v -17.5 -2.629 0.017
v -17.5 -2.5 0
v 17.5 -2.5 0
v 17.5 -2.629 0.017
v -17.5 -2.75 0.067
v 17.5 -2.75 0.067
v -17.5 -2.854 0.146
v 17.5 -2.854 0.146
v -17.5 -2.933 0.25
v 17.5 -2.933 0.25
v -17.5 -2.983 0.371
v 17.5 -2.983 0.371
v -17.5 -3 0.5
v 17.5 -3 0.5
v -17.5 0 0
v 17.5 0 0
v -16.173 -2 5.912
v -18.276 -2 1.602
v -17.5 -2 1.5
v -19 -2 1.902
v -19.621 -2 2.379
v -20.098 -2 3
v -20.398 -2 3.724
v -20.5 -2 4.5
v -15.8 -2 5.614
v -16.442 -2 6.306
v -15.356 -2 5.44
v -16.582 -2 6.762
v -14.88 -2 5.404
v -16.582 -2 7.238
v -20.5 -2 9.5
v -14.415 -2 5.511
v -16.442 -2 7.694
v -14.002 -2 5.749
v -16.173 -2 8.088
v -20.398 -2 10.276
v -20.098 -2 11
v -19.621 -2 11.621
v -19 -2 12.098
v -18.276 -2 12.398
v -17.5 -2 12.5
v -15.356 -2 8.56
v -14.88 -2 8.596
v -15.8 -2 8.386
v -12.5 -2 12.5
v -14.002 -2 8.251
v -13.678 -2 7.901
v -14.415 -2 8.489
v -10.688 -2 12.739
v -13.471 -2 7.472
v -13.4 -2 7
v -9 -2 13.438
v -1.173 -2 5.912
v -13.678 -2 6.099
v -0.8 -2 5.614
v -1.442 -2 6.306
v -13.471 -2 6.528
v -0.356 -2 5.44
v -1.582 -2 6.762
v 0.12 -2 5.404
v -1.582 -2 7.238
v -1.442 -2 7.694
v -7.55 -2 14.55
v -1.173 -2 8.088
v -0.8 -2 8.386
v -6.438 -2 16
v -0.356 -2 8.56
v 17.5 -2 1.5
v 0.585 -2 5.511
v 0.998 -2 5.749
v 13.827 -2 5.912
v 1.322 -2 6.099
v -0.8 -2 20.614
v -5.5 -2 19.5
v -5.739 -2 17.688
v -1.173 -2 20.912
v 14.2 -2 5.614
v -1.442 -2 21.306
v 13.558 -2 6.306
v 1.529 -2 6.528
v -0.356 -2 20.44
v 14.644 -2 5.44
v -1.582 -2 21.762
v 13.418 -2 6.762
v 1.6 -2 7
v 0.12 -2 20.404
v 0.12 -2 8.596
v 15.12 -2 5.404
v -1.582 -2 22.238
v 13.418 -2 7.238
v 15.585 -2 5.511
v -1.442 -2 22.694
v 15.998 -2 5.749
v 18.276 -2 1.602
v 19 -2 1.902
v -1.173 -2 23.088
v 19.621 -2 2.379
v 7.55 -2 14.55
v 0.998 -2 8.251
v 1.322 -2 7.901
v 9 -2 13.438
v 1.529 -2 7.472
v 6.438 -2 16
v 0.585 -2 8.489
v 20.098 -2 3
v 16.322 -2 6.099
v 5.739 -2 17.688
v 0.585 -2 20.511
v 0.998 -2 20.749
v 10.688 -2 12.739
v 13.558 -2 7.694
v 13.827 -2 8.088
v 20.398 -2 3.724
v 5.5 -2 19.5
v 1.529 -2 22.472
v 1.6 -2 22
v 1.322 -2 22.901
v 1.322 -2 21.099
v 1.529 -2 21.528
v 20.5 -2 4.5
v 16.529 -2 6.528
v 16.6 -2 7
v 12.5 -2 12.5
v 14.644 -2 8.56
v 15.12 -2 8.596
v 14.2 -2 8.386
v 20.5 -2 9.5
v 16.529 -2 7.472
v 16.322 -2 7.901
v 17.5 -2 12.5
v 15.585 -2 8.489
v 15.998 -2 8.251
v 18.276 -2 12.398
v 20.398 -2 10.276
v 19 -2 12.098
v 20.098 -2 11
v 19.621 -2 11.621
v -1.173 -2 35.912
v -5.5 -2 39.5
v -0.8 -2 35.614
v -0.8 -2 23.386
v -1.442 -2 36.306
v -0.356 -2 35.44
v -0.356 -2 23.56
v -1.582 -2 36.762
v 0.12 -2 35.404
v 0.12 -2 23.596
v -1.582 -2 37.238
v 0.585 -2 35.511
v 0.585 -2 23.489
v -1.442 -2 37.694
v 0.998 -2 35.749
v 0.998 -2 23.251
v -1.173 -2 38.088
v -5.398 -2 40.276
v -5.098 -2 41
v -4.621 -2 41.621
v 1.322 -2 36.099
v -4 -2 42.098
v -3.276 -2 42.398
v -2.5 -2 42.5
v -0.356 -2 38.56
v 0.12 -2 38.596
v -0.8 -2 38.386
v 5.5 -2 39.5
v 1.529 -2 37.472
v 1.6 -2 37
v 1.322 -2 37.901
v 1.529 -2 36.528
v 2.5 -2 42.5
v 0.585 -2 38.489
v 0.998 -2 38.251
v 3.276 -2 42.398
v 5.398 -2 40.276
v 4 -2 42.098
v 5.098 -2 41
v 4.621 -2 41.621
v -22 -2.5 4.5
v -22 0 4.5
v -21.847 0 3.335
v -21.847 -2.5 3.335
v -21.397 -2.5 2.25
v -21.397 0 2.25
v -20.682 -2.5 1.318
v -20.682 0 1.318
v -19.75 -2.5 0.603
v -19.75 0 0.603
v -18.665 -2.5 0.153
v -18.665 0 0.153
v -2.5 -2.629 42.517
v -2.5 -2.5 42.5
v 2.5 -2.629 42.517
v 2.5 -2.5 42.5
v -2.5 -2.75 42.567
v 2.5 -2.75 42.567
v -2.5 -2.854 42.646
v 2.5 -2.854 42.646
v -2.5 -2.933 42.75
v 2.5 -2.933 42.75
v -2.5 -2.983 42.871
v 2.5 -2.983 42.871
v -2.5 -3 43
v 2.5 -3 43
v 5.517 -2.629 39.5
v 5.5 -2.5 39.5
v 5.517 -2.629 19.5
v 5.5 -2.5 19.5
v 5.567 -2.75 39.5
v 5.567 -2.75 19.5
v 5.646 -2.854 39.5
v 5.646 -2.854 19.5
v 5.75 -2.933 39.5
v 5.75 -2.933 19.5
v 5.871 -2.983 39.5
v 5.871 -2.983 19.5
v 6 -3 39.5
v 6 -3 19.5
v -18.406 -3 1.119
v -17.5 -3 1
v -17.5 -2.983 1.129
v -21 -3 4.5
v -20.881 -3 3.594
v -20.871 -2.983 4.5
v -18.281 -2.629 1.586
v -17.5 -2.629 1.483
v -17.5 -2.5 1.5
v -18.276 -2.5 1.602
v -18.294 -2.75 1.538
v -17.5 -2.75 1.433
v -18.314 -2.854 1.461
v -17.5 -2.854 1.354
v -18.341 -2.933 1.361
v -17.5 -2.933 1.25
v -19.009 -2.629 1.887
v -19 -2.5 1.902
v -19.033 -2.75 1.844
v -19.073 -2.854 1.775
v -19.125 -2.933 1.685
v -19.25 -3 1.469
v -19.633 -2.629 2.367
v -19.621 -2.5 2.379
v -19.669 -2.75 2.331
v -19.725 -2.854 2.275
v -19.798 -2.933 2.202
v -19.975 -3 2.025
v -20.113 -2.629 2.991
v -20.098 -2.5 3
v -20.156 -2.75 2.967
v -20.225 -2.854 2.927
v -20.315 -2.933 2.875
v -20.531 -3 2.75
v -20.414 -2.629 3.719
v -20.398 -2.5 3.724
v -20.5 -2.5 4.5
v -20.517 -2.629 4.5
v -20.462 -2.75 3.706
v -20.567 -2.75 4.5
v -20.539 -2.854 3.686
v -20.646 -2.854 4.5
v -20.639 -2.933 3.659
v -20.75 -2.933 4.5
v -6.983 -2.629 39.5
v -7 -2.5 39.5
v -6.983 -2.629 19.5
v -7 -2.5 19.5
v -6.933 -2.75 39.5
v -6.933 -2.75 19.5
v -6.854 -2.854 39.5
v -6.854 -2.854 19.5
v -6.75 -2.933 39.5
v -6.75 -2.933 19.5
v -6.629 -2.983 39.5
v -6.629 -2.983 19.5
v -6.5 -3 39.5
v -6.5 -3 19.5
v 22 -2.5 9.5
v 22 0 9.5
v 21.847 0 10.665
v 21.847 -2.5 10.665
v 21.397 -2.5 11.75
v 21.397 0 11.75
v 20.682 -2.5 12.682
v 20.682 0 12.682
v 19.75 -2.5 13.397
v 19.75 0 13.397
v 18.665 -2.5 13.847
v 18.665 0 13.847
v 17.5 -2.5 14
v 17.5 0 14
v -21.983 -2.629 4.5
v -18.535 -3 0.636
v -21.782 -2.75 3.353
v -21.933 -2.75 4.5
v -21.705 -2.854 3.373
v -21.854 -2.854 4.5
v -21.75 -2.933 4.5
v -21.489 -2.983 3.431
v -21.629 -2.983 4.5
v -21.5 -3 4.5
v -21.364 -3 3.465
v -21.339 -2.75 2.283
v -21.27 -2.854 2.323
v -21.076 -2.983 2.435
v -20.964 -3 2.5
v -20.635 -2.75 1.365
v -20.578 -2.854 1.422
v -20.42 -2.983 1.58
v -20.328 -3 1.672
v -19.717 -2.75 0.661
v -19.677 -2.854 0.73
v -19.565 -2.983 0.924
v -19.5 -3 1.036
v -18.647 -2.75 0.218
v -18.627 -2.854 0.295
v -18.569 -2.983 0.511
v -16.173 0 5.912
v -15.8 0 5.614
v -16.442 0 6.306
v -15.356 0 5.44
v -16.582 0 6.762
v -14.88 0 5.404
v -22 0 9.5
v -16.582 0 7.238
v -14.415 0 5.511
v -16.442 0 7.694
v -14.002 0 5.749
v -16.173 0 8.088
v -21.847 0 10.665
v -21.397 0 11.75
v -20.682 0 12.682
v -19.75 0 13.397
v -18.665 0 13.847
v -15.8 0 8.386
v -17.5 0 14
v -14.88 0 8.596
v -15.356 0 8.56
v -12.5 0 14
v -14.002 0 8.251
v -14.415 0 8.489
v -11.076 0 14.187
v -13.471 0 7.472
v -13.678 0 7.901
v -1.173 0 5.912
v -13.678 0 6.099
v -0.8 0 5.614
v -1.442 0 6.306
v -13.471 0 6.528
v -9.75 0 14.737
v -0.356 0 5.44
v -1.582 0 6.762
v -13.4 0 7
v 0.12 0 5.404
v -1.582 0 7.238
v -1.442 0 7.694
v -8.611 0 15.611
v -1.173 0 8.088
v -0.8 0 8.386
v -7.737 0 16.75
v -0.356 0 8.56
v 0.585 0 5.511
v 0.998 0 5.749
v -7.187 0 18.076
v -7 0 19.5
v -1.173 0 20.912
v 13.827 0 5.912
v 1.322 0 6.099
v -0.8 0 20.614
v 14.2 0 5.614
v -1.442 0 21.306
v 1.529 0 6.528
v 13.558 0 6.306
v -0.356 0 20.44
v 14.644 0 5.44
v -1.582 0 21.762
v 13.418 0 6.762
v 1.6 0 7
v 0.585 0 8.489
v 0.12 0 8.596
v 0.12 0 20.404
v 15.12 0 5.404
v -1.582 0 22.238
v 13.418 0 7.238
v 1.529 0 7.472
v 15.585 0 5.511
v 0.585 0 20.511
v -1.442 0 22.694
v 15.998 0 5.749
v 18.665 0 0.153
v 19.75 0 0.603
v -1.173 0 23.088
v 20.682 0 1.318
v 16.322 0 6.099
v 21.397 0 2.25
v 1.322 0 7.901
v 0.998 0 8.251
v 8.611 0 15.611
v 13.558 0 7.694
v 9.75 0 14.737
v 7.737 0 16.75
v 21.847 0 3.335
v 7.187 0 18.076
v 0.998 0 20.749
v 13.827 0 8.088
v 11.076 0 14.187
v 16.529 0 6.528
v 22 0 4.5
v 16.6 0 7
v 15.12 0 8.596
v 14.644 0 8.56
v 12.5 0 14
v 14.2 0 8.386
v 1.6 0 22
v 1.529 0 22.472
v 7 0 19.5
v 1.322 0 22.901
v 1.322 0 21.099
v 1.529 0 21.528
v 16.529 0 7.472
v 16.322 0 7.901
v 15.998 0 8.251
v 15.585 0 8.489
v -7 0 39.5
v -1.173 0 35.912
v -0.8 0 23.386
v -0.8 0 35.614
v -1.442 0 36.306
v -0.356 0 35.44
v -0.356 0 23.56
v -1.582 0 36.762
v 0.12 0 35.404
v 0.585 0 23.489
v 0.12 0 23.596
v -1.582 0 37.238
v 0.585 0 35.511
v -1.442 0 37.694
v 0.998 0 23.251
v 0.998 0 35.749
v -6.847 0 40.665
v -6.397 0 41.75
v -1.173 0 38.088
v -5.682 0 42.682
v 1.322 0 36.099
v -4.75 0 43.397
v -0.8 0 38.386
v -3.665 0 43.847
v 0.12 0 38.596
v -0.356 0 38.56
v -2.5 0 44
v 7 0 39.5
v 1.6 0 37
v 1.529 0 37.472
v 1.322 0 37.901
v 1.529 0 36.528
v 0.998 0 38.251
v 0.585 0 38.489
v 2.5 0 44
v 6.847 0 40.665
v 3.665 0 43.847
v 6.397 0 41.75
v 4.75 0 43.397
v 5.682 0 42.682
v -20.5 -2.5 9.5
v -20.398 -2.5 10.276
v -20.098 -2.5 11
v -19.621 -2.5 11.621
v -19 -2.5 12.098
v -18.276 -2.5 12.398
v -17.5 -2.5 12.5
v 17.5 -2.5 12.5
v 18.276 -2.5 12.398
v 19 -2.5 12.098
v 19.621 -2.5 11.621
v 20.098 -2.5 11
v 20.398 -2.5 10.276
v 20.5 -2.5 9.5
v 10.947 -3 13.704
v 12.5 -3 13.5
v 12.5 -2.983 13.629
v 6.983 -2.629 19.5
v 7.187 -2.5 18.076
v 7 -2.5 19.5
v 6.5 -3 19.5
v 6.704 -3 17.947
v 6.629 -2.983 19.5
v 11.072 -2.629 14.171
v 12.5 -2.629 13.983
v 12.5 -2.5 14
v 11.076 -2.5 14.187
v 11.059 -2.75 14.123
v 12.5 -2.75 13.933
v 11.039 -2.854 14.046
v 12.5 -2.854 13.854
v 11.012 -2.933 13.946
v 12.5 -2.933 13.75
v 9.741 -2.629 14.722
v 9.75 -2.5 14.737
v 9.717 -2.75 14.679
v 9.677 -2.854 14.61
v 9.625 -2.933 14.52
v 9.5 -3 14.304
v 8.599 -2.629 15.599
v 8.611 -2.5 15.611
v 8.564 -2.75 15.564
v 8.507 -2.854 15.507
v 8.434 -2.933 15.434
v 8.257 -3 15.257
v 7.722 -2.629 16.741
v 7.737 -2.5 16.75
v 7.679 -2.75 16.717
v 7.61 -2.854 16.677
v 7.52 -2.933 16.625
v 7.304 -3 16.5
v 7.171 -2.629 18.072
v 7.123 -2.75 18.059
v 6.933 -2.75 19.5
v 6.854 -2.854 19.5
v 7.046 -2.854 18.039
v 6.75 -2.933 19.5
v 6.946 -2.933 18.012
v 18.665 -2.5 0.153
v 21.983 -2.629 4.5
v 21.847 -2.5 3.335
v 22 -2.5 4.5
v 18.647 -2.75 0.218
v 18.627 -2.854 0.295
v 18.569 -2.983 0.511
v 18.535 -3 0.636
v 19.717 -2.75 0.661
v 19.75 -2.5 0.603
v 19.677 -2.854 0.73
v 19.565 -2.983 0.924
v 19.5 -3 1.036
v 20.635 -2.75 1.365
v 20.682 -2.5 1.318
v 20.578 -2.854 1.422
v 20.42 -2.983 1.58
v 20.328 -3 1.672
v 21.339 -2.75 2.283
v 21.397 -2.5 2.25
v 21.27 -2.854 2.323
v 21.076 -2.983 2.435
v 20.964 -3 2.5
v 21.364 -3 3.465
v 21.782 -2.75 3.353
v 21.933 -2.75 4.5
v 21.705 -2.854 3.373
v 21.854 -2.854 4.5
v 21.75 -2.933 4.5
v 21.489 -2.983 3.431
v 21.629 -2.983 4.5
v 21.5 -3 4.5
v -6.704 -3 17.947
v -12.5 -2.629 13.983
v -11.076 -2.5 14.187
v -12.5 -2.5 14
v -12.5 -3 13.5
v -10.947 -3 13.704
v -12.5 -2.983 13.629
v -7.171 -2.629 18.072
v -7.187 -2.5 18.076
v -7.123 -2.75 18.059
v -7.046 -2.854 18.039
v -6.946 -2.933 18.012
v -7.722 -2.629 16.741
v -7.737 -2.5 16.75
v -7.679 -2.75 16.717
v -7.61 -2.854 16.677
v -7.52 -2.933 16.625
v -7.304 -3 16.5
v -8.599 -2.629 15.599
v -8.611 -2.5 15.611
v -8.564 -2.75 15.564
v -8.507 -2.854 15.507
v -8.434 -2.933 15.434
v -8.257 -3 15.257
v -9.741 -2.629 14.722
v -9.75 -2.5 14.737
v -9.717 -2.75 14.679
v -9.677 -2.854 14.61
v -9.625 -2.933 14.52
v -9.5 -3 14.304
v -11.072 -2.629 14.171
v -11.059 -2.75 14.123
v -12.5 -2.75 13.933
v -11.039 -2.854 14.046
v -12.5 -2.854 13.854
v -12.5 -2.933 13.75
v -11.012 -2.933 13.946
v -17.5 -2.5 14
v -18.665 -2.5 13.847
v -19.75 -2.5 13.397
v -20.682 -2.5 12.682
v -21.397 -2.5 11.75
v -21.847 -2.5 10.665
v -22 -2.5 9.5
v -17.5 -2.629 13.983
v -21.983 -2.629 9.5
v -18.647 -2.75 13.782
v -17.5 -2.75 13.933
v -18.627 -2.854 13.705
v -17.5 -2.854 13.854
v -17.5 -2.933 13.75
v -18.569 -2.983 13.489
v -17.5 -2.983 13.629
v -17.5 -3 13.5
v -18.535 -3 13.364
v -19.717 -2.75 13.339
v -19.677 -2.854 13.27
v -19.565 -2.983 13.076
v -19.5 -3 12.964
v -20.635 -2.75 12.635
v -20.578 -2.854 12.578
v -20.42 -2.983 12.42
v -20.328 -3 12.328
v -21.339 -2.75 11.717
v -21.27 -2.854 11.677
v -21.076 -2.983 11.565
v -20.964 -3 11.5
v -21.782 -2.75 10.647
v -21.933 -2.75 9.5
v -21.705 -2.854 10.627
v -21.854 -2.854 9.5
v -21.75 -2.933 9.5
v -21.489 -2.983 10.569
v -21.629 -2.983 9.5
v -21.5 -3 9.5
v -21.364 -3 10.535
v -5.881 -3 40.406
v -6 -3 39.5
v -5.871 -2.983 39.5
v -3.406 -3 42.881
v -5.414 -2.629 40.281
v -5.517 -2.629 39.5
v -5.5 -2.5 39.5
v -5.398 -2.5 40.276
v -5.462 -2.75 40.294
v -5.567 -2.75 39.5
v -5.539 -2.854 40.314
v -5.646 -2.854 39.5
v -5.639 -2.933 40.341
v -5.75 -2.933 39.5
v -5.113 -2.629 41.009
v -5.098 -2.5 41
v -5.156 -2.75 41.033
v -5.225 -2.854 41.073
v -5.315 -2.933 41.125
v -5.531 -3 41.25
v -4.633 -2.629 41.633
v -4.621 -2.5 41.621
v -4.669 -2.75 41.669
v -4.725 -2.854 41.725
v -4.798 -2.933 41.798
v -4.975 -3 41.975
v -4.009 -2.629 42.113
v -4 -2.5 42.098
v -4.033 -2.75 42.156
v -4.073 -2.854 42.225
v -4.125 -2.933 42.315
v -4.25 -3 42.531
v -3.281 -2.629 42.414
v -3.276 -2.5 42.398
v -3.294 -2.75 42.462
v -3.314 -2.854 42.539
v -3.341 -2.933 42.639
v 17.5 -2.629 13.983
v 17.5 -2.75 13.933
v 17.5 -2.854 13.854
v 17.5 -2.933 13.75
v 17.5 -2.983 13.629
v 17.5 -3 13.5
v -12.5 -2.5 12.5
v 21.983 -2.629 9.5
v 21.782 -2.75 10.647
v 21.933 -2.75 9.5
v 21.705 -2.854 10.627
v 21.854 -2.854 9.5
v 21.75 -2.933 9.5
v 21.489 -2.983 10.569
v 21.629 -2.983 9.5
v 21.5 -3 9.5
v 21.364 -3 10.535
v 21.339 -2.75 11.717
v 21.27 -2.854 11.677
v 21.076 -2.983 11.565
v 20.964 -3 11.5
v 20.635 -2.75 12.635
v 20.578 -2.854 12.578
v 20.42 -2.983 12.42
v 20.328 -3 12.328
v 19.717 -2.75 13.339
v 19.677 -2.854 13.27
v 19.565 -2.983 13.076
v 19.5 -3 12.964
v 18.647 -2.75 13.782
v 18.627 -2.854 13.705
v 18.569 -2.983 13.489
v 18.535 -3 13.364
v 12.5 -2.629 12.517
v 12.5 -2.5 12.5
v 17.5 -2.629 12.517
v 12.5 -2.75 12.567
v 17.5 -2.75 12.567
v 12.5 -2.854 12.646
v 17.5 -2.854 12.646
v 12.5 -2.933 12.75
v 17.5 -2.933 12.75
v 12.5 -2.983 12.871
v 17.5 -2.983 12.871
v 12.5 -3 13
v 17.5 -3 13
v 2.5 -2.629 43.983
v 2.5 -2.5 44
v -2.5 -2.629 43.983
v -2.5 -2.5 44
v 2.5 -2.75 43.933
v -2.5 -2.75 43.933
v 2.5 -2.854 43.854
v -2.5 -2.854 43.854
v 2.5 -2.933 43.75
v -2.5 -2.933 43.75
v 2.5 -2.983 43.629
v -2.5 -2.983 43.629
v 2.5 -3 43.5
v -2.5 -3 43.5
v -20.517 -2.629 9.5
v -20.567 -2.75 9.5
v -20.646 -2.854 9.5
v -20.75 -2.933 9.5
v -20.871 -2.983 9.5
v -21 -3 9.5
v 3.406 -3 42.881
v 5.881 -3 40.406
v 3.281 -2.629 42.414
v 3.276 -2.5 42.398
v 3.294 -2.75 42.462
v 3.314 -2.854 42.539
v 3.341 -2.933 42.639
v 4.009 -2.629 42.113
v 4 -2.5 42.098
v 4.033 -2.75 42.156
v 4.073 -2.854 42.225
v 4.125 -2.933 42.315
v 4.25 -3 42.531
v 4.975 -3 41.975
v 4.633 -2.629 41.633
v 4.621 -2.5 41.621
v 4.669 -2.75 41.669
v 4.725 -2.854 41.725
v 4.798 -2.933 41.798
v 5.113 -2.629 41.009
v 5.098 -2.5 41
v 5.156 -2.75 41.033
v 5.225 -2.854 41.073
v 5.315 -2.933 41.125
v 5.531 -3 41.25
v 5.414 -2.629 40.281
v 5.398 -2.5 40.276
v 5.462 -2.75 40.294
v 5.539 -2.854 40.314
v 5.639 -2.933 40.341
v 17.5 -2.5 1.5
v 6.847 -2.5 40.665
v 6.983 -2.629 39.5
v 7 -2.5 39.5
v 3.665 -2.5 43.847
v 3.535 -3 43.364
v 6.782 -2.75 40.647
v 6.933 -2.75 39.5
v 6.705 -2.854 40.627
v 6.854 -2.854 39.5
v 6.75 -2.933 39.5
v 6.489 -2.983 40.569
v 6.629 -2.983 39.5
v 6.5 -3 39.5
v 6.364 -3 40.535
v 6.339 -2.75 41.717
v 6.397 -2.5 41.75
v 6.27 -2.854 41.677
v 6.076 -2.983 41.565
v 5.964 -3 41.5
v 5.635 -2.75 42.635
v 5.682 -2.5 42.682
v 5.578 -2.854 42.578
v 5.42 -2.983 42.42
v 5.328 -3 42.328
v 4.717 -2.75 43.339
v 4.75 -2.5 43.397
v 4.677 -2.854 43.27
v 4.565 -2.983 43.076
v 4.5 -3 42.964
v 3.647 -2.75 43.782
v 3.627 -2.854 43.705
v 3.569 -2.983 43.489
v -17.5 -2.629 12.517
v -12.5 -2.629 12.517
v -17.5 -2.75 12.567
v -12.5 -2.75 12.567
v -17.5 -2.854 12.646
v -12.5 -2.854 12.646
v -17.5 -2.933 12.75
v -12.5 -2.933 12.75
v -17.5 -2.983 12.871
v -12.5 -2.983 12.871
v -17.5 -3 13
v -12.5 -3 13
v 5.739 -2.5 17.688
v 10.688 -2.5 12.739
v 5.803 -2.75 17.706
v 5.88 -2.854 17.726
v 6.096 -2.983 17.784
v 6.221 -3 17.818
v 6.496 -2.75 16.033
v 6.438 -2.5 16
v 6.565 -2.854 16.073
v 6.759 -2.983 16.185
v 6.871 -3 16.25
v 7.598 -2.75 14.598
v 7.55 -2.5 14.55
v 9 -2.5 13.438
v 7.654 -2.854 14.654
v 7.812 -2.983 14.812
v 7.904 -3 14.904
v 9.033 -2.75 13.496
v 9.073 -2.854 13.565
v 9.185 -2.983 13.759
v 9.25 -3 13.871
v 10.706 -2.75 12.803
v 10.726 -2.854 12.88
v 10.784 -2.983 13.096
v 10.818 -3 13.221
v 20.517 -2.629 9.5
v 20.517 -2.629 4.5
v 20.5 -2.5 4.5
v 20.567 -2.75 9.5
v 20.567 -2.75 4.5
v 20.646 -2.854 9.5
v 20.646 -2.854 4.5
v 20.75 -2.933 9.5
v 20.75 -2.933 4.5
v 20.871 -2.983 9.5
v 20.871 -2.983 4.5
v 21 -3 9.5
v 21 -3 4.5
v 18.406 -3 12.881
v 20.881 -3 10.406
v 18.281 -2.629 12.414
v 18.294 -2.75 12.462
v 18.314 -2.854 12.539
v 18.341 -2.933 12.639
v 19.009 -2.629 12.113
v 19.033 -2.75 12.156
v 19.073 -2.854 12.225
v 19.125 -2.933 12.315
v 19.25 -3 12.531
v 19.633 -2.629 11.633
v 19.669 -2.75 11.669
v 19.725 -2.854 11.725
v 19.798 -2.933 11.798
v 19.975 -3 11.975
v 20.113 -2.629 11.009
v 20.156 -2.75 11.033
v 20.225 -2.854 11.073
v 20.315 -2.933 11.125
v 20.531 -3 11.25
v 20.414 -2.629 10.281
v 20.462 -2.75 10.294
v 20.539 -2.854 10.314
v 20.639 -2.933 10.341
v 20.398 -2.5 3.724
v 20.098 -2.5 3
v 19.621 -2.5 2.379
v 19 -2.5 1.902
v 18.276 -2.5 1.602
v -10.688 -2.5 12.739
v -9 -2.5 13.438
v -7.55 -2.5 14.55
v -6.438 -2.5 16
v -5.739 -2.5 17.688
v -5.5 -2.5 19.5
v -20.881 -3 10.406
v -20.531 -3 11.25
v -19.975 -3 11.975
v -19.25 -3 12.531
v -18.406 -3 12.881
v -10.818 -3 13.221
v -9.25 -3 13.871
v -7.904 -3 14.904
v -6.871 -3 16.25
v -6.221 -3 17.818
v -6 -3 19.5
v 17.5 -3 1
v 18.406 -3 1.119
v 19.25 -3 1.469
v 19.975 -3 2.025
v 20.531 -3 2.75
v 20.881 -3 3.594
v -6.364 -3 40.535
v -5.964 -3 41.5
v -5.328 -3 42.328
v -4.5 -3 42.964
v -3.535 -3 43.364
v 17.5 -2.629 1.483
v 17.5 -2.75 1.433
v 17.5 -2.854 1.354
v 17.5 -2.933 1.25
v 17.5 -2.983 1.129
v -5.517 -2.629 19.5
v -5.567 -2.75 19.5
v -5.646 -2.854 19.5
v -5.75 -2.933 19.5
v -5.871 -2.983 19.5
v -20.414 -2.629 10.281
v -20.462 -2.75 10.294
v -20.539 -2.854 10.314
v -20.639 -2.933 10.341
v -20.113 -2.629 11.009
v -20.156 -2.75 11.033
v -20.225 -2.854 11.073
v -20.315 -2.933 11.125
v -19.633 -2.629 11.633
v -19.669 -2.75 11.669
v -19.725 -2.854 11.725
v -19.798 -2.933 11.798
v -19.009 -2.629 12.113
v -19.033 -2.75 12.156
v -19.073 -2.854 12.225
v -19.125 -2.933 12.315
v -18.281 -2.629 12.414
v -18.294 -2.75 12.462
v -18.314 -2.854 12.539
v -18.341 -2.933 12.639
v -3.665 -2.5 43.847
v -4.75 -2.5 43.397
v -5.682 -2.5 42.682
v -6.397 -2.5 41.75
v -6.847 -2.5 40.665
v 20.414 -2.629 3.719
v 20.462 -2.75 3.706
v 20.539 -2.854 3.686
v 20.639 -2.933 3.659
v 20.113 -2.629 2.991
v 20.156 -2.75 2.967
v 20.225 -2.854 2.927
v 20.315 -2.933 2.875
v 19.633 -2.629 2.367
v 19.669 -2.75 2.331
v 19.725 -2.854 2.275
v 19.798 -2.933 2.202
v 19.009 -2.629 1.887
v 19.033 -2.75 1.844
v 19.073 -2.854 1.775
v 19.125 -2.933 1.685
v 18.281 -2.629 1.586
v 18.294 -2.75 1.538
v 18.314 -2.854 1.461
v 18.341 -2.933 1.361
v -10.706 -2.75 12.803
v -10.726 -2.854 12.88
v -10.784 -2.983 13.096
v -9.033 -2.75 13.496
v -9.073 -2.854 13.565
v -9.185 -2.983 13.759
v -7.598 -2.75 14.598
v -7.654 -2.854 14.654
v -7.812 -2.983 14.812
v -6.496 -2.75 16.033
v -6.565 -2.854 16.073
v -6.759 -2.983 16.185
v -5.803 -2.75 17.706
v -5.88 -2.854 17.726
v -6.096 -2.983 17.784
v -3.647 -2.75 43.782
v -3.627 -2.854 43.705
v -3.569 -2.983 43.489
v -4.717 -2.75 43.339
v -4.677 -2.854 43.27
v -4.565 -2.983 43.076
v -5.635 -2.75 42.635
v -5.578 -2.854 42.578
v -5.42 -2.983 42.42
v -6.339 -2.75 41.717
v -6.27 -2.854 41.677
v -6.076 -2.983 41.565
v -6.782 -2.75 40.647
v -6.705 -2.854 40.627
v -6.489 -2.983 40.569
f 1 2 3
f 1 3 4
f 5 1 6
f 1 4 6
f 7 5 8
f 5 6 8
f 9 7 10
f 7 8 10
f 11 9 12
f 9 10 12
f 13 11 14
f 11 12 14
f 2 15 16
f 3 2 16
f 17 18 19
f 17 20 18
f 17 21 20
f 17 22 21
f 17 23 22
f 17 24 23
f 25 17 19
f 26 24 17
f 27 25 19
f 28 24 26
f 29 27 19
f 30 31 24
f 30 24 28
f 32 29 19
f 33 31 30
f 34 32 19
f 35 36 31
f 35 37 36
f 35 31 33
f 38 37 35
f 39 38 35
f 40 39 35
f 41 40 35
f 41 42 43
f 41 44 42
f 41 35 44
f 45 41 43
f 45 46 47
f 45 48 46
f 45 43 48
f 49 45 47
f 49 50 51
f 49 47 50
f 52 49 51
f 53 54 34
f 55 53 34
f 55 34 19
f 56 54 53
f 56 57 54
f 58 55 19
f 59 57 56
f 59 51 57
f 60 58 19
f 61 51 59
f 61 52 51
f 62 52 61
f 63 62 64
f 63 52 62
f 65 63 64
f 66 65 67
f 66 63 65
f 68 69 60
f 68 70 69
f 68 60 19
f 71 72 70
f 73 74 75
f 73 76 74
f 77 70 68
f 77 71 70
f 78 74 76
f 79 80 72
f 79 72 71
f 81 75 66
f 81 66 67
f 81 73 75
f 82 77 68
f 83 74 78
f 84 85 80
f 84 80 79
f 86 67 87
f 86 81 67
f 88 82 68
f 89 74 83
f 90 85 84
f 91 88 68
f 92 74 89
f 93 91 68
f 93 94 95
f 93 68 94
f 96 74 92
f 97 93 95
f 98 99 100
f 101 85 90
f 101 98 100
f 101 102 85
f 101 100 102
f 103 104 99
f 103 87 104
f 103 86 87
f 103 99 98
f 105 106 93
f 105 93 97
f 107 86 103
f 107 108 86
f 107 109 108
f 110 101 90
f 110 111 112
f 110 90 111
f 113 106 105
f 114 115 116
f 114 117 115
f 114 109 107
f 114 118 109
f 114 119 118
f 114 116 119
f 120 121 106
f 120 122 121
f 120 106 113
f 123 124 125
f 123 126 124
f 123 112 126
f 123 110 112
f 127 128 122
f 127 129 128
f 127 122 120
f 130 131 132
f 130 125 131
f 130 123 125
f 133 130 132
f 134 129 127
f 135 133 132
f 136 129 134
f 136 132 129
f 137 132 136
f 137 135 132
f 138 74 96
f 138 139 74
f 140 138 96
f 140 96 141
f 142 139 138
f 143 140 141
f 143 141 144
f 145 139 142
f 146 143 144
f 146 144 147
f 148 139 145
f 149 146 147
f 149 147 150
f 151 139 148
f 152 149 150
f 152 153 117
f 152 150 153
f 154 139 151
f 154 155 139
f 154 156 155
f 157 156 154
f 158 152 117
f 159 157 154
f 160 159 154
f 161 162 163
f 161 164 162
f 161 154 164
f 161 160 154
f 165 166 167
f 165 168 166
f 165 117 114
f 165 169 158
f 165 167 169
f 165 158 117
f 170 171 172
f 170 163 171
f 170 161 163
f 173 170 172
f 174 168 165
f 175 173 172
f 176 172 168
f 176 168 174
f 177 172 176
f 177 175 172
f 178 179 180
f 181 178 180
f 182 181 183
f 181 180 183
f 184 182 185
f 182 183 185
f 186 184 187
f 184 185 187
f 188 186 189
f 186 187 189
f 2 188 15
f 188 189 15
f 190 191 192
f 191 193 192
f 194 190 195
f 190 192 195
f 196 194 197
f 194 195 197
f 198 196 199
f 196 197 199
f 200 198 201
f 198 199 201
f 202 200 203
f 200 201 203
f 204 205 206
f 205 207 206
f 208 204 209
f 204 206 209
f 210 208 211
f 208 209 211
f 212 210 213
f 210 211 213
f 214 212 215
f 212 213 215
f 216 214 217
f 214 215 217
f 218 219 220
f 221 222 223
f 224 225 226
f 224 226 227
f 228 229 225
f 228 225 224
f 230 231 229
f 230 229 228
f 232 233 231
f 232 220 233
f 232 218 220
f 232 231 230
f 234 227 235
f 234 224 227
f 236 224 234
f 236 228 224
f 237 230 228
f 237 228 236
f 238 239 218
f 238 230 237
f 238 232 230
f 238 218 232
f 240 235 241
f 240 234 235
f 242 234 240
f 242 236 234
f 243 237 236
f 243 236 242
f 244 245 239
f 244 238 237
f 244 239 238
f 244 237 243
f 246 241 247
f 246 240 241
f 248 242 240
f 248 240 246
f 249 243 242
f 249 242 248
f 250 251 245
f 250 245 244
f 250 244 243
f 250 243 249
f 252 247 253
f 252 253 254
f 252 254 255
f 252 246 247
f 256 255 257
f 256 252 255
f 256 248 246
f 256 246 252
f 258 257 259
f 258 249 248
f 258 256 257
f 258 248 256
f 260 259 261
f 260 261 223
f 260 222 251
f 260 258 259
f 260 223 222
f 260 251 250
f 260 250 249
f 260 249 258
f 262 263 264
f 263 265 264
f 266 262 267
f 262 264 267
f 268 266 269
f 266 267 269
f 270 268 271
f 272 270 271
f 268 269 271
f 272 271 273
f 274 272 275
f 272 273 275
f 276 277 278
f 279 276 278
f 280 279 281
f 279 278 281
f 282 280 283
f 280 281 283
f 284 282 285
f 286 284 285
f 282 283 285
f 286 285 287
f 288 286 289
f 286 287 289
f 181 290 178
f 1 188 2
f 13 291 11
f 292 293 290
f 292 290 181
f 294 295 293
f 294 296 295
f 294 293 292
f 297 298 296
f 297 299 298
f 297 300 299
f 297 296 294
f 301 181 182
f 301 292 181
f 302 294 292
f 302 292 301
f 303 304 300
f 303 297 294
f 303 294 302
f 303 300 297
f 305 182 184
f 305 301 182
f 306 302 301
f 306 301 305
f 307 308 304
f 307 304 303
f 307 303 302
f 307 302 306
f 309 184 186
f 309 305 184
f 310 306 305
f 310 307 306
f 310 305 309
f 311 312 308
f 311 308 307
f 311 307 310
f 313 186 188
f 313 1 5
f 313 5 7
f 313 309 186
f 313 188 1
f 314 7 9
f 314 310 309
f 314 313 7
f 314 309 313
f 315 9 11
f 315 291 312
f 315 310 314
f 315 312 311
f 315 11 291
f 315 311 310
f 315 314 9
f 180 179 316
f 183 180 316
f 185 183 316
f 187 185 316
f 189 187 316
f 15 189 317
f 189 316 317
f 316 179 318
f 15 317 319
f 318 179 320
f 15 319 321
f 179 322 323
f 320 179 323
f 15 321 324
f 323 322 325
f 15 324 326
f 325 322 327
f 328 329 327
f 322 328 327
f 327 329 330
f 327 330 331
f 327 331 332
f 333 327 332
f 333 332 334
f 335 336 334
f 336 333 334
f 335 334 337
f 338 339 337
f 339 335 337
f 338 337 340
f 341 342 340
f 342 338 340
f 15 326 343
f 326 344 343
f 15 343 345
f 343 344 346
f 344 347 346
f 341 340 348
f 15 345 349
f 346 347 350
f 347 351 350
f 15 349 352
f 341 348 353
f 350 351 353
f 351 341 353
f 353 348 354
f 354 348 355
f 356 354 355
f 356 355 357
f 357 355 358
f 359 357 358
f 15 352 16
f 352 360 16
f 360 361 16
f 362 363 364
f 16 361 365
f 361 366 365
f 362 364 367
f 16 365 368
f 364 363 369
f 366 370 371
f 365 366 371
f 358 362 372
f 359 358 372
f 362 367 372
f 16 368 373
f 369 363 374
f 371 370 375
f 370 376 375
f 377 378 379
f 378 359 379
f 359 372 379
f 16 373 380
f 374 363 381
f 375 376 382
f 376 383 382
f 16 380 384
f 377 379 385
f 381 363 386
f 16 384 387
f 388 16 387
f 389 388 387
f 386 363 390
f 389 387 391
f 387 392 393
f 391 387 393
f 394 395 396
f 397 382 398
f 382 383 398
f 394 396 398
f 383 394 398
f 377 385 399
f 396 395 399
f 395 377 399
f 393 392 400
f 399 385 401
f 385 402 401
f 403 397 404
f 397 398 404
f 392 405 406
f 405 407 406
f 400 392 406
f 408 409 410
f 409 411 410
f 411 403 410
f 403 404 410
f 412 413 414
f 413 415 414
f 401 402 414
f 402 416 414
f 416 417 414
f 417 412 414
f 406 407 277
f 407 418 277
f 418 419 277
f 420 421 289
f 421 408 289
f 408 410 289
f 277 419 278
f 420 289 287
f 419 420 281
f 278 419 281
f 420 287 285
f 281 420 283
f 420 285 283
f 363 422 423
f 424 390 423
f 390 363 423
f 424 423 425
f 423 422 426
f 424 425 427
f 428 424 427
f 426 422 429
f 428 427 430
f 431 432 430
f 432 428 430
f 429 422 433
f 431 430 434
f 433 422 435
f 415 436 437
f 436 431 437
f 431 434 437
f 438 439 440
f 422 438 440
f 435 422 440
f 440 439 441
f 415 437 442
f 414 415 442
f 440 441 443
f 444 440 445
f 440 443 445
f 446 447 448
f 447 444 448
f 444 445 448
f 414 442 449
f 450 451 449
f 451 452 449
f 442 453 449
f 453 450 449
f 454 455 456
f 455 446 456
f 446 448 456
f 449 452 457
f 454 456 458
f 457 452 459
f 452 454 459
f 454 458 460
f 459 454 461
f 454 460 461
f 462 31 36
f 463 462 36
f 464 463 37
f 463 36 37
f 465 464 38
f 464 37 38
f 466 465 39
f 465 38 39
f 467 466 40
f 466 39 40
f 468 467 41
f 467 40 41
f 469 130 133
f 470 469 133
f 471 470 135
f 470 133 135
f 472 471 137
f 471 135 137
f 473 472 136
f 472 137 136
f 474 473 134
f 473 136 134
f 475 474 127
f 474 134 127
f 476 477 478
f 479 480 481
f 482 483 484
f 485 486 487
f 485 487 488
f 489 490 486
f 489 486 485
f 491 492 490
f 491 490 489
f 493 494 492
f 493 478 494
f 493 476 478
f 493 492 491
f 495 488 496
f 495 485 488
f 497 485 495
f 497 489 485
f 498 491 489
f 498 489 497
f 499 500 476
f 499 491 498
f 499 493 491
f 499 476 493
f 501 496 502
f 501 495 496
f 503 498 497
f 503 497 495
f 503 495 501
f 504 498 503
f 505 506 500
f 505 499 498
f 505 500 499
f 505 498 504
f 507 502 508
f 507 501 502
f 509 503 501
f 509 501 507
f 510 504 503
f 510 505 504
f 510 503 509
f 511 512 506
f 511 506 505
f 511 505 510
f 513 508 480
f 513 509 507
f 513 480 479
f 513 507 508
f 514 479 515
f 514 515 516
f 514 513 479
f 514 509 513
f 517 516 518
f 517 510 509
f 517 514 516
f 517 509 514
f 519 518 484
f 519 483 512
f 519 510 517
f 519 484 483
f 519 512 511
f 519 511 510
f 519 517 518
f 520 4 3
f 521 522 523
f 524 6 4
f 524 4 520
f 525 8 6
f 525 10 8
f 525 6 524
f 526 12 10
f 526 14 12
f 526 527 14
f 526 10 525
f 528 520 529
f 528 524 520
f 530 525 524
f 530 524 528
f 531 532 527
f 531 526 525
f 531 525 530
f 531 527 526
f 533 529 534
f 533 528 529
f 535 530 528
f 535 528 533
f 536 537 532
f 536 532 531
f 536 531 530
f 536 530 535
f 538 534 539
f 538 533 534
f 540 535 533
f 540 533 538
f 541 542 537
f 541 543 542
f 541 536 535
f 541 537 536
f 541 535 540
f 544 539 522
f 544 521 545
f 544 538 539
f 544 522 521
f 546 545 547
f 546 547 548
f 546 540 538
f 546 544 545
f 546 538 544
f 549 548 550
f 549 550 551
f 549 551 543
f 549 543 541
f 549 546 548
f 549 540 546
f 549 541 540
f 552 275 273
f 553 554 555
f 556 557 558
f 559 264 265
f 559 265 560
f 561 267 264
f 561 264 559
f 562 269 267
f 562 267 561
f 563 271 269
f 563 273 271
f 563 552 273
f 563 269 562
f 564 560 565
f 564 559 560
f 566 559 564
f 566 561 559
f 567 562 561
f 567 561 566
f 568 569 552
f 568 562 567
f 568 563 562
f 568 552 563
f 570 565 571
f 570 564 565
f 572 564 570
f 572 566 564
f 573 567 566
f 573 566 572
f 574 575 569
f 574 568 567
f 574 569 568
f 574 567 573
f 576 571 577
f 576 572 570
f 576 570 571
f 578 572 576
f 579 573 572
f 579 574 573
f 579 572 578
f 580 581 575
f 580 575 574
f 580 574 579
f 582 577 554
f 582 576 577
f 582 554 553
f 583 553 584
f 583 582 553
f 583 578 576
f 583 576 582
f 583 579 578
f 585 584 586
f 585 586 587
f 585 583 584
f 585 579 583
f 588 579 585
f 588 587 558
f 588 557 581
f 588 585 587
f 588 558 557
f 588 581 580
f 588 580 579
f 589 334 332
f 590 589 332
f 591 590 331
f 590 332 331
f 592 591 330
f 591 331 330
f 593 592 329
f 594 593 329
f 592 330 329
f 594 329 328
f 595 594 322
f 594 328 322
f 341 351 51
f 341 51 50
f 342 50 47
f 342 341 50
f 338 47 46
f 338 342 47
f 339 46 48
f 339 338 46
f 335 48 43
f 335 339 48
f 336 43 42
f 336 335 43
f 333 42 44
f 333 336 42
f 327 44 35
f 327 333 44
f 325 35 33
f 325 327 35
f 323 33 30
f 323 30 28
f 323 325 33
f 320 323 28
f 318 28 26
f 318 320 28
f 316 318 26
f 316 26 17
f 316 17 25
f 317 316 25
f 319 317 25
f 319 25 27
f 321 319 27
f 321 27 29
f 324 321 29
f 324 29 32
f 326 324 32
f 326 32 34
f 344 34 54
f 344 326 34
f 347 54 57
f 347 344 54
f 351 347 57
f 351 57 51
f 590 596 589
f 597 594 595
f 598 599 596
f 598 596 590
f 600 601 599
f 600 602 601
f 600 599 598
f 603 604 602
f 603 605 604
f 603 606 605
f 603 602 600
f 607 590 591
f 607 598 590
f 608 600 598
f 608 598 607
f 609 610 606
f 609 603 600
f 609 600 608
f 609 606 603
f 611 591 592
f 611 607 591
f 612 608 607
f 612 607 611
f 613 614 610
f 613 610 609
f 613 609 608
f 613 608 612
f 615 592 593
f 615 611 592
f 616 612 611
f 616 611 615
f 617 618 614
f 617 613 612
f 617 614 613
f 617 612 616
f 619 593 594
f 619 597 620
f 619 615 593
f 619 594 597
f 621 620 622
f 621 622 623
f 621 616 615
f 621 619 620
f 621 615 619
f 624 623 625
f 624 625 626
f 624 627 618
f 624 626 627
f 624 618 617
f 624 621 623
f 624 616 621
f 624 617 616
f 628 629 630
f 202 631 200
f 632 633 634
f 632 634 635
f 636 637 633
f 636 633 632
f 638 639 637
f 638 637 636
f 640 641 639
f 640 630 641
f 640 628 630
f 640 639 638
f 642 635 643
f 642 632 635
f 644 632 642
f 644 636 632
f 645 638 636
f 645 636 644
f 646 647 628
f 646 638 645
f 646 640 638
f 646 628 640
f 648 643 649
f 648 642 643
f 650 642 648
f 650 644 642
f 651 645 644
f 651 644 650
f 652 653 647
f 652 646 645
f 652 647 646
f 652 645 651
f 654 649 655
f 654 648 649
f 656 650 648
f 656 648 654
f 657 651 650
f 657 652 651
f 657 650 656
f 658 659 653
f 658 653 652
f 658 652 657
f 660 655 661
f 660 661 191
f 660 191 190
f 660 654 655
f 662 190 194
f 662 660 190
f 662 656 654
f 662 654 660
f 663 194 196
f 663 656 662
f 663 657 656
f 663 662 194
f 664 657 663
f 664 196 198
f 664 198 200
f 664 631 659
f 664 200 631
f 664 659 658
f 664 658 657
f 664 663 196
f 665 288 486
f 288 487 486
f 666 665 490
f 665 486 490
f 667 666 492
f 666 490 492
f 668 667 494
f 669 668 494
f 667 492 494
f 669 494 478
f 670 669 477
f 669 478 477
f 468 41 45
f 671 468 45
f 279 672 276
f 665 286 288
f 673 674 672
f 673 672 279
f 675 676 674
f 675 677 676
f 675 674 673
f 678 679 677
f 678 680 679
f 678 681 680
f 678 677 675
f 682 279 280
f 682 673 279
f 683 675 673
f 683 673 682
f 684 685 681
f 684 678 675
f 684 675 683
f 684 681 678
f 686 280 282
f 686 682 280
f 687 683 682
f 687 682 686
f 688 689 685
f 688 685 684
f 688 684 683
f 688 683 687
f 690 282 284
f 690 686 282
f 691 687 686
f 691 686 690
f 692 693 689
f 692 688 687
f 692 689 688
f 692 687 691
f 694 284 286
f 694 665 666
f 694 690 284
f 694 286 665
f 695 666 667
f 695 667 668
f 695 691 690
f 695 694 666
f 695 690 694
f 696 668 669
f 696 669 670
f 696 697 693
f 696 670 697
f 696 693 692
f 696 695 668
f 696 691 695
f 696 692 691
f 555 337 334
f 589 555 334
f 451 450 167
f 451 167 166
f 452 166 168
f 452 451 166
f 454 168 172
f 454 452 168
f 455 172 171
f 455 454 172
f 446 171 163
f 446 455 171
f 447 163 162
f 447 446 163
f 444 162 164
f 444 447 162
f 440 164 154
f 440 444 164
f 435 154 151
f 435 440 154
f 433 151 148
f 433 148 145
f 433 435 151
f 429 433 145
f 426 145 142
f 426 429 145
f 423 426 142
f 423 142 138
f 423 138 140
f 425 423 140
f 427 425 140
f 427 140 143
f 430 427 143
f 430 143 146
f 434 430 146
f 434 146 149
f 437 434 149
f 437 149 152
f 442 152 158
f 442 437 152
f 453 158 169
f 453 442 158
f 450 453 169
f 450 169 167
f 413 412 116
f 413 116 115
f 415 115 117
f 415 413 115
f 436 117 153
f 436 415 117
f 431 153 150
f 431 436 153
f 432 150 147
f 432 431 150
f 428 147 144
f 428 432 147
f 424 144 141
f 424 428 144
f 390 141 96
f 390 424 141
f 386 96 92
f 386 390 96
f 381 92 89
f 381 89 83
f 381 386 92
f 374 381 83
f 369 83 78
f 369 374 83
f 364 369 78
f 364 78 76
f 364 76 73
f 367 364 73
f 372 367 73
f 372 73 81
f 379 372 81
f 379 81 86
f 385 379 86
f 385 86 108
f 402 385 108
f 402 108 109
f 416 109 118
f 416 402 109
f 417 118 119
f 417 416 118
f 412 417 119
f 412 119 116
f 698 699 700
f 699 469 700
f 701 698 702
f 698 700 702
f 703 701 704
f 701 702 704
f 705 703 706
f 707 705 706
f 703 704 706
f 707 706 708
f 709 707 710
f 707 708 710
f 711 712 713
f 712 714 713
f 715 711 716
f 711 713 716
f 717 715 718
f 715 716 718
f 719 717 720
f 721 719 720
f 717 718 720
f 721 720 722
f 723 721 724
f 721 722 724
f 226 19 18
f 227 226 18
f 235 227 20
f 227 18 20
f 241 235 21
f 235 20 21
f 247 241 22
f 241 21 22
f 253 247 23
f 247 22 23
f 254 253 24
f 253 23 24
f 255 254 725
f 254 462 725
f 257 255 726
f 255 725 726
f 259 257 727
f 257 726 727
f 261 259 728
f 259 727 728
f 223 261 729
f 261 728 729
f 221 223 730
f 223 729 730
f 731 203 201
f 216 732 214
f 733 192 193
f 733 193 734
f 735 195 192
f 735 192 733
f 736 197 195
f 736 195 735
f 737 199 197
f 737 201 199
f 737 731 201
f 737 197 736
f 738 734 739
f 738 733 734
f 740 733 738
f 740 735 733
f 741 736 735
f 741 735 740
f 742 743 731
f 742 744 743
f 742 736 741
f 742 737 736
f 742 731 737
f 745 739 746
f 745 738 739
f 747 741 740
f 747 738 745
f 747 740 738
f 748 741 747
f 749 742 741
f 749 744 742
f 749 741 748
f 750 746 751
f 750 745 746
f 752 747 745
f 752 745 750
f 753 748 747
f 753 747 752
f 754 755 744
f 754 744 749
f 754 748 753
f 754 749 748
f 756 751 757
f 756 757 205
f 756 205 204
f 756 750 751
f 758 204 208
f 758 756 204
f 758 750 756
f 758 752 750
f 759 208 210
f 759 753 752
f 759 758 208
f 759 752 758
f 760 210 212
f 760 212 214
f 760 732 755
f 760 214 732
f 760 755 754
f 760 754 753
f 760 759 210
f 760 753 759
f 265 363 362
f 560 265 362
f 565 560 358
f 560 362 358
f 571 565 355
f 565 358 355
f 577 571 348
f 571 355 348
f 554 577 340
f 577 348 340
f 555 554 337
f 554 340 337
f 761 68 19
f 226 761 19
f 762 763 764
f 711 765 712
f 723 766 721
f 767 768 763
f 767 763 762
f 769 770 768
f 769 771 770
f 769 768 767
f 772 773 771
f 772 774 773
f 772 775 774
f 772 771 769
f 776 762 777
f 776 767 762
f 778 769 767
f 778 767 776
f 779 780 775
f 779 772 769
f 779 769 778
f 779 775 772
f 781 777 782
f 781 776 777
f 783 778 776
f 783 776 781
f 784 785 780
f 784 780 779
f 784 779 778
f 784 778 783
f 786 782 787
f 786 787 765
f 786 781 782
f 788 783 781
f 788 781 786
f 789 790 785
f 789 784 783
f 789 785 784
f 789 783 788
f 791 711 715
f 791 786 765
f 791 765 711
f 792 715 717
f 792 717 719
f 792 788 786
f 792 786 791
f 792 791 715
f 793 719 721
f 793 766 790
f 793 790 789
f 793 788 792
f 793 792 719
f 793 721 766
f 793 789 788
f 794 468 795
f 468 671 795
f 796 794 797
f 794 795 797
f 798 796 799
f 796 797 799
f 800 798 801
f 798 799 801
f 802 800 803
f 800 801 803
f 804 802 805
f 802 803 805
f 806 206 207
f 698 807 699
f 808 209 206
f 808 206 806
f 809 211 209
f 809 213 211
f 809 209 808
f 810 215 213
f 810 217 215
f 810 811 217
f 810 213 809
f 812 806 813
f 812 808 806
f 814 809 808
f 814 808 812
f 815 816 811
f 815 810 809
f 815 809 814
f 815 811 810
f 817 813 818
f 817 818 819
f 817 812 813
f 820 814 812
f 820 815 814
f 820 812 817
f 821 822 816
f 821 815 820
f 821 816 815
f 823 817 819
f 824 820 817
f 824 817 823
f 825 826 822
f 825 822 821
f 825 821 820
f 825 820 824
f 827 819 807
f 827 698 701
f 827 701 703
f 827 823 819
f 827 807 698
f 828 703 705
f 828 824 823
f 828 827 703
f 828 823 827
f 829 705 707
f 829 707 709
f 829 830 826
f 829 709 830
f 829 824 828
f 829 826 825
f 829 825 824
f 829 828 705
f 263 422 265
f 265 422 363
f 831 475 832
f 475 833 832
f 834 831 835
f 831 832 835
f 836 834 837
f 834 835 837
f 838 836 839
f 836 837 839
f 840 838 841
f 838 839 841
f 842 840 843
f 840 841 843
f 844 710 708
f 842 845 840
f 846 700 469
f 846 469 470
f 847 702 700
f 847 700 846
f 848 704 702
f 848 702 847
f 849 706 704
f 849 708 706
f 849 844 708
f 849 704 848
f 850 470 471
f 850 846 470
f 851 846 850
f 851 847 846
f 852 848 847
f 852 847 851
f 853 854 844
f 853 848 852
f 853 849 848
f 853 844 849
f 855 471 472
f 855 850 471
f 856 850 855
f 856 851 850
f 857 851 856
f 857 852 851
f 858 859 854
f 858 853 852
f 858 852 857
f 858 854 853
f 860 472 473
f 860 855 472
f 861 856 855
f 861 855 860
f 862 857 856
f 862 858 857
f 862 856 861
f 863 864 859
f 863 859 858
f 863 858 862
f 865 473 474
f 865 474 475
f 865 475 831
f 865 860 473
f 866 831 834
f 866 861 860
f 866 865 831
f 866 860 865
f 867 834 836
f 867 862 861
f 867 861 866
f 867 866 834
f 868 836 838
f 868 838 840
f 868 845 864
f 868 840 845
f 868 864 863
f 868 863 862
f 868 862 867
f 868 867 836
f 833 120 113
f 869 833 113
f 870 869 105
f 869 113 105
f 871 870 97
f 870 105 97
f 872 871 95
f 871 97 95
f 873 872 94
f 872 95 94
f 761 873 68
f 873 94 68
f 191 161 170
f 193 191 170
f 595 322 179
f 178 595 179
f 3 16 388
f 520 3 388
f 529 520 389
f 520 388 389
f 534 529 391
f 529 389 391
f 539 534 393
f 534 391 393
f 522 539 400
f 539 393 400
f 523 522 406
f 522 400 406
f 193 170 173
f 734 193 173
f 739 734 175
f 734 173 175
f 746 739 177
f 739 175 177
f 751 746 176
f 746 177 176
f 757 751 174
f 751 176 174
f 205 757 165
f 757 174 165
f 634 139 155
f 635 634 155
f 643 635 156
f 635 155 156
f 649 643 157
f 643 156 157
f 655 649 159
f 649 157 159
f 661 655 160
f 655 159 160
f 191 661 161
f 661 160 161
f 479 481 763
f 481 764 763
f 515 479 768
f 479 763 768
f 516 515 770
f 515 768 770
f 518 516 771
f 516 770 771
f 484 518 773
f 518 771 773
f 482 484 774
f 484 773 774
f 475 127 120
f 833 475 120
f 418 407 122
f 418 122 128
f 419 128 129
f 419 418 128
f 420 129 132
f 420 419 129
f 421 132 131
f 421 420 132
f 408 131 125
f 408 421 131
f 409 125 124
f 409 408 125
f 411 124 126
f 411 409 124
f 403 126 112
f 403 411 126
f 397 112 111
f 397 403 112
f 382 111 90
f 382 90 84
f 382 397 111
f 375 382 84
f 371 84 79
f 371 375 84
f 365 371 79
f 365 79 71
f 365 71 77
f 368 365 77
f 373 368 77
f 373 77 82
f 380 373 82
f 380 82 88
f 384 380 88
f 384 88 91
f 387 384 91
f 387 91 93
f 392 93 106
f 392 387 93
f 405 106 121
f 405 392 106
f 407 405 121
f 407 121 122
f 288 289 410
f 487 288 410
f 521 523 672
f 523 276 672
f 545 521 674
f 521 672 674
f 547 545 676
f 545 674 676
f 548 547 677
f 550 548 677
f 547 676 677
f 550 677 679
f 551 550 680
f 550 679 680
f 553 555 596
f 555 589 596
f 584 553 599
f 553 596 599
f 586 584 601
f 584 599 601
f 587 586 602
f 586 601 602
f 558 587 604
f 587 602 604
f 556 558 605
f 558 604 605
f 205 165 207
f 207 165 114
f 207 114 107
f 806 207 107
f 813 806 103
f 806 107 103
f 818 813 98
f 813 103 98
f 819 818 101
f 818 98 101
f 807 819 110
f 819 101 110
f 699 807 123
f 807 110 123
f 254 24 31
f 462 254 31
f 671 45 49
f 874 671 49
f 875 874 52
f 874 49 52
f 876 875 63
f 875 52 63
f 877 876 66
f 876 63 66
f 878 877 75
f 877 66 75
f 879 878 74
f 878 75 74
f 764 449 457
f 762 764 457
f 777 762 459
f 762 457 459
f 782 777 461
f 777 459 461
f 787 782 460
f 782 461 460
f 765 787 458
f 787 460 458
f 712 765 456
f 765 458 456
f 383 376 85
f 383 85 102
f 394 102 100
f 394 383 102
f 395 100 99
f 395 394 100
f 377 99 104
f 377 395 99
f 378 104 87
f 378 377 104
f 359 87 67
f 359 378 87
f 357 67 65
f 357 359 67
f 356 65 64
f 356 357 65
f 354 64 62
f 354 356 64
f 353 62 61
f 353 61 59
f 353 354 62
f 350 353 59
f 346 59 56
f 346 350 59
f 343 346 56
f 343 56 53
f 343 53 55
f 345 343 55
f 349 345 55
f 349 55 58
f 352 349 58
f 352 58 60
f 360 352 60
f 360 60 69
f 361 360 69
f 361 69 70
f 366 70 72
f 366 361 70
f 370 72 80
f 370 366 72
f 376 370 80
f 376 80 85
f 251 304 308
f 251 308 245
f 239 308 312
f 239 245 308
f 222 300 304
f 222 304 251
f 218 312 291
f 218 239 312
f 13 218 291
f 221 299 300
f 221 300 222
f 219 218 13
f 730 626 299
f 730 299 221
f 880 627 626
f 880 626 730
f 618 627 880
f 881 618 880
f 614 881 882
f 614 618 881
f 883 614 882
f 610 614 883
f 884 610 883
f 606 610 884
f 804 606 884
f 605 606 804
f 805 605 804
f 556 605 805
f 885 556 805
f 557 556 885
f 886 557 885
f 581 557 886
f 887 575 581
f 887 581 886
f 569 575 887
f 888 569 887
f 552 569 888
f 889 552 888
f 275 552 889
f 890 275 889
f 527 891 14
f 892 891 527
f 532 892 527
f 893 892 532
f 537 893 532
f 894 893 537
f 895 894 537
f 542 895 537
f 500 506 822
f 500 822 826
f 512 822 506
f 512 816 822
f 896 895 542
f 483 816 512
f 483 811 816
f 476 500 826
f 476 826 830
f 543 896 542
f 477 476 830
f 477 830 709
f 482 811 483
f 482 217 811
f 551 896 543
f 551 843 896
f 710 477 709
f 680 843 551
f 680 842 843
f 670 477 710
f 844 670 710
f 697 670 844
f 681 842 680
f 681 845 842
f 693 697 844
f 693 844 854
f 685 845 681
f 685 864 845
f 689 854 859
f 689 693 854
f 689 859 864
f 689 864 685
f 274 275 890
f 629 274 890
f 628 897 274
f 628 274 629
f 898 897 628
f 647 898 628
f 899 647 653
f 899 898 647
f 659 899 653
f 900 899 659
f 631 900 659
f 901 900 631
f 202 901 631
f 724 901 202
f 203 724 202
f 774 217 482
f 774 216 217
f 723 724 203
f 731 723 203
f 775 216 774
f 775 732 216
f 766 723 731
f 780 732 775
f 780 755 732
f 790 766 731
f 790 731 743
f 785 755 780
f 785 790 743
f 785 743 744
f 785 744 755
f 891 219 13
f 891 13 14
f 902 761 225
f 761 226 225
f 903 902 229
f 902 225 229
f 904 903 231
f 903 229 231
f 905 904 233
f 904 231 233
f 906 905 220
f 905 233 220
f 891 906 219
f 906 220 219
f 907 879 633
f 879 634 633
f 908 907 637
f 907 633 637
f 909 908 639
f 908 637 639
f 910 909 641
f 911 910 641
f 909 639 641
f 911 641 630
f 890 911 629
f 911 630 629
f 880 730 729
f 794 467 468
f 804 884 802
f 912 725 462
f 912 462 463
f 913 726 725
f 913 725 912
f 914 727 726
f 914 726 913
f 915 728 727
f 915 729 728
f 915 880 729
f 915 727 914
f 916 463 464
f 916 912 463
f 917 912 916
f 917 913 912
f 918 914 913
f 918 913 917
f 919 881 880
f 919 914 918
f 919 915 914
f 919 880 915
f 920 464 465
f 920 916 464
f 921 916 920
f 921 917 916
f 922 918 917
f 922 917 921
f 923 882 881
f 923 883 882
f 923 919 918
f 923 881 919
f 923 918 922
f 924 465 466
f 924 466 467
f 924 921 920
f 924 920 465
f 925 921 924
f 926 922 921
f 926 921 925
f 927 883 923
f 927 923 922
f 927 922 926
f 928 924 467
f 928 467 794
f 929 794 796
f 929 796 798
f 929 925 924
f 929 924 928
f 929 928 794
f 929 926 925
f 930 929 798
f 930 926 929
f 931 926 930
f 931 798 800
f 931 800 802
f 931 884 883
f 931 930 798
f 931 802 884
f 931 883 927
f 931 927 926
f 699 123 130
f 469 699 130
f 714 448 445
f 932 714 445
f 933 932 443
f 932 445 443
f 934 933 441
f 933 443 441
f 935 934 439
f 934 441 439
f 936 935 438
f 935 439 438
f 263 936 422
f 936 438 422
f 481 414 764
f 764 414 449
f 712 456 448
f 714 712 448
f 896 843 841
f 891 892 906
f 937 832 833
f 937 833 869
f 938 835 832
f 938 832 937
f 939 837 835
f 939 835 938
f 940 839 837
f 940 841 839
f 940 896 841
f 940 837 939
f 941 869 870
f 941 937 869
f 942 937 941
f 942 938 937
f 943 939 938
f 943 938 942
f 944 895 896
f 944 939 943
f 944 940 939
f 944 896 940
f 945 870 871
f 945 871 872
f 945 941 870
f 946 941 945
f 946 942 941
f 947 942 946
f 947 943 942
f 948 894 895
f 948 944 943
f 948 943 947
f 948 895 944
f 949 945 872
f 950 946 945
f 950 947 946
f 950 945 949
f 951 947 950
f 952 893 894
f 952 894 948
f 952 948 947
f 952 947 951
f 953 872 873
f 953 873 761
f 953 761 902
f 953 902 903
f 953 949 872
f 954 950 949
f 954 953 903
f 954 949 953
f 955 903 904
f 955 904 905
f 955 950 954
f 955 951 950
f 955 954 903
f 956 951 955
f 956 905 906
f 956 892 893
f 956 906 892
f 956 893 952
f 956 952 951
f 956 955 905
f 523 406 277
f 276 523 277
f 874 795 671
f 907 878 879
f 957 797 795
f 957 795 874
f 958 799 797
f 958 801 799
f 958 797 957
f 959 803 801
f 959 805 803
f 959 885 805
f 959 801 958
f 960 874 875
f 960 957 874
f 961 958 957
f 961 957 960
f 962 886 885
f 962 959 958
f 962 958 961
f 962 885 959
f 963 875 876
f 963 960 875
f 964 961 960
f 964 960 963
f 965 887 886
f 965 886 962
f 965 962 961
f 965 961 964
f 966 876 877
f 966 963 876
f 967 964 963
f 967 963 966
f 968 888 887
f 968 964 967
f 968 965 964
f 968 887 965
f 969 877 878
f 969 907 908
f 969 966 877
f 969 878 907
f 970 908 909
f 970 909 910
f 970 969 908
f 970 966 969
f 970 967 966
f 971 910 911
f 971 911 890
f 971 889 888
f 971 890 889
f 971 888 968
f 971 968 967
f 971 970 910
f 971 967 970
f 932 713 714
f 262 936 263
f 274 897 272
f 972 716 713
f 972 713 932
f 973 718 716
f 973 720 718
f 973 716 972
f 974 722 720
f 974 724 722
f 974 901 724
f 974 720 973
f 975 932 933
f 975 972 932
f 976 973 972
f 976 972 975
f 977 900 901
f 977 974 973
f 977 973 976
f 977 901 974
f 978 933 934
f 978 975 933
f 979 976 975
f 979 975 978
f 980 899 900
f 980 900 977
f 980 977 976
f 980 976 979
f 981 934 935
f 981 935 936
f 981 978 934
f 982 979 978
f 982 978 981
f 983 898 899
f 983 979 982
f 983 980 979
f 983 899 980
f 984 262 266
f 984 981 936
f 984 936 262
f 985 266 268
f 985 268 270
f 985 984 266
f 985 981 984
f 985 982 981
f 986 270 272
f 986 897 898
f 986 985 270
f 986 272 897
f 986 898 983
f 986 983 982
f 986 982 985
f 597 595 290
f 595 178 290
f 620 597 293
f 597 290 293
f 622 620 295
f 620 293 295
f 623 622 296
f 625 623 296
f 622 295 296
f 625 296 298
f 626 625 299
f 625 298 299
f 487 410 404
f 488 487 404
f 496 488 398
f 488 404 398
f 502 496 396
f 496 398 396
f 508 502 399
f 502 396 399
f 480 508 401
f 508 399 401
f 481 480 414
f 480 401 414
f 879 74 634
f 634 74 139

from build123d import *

# Parameters (mm, degrees)
F0_R     = 1.6
F1_DEPTH = 2
F3_DEPTH = 1
F4_R     = 0.5


with BuildPart() as f1:
    # F0 (on Front) → F1 (new body)
    with BuildSketch(Plane.XZ):
        with BuildLine():
            Line((2.5, 44), (0, 44))
            Line((0, 44), (-2.5, 44))
            ThreePointArc((-2.5, 44), (-5.6819805153, 42.6819805153), (-7, 39.5))
            Line((-7, 39.5), (-7, 19.5))
            ThreePointArc((-7, 19.5), (-8.6109127035, 15.6109127035), (-12.5, 14))
            Line((-12.5, 14), (-17.5, 14))
            ThreePointArc((-17.5, 14), (-20.6819805153, 12.6819805153), (-22, 9.5))
            Line((-22, 9.5), (-22, 4.5))
            ThreePointArc((-22, 4.5), (-20.6819805153, 1.3180194847), (-17.5, 0))
            Line((-17.5, 0), (0, 0))
            Line((0, 0), (17.5, 0))
            ThreePointArc((17.5, 0), (20.6819805153, 1.3180194847), (22, 4.5))
            Line((22, 4.5), (22, 9.5))
            ThreePointArc((22, 9.5), (20.6819805153, 12.6819805153), (17.5, 14))
            Line((17.5, 14), (12.5, 14))
            ThreePointArc((12.5, 14), (8.6109127035, 15.6109127035), (7, 19.5))
            Line((7, 19.5), (7, 39.5))
            ThreePointArc((7, 39.5), (5.6819805153, 42.6819805153), (2.5, 44))
        make_face()
        with Locations((-15, 7)):
            Circle(F0_R, mode=Mode.SUBTRACT)
        with Locations((0, 7)):
            Circle(F0_R, mode=Mode.SUBTRACT)
        with Locations((15, 7)):
            Circle(F0_R, mode=Mode.SUBTRACT)
        with Locations((0, 22)):
            Circle(F0_R, mode=Mode.SUBTRACT)
        with Locations((0, 37)):
            Circle(F0_R, mode=Mode.SUBTRACT)
    extrude(amount=F1_DEPTH)

    # F2 (on face) → F3 (join)
    with BuildSketch(Plane.XZ.offset(2)):
        with BuildLine():
            ThreePointArc((22, 9.5), (20.6819805153, 12.6819805153), (17.5, 14))
            Line((17.5, 14), (12.5, 14))
            ThreePointArc((12.5, 14), (8.6109127035, 15.6109127035), (7, 19.5))
            Line((7, 19.5), (7, 39.5))
            ThreePointArc((7, 39.5), (5.6819805153, 42.6819805153), (2.5, 44))
            Line((2.5, 44), (-2.5, 44))
            ThreePointArc((-2.5, 44), (-5.6819805153, 42.6819805153), (-7, 39.5))
            Line((-7, 39.5), (-7, 19.5))
            ThreePointArc((-7, 19.5), (-8.6109127035, 15.6109127035), (-12.5, 14))
            Line((-12.5, 14), (-17.5, 14))
            ThreePointArc((-17.5, 14), (-20.6819805153, 12.6819805153), (-22, 9.5))
            Line((-22, 9.5), (-22, 4.5))
            ThreePointArc((-22, 4.5), (-20.6819805153, 1.3180194847), (-17.5, 0))
            Line((-17.5, 0), (17.5, 0))
            ThreePointArc((17.5, 0), (20.6819805153, 1.3180194847), (22, 4.5))
            Line((22, 4.5), (22, 9.5))
        make_face()
        with BuildLine():
            Line((-5.5, 19.5), (-5.5, 39.5))
            ThreePointArc((-5.5, 39.5), (-4.6213203436, 41.6213203436), (-2.5, 42.5))
            Line((-2.5, 42.5), (2.5, 42.5))
            ThreePointArc((2.5, 42.5), (4.6213203436, 41.6213203436), (5.5, 39.5))
            Line((5.5, 39.5), (5.5, 19.5))
            ThreePointArc((5.5, 19.5), (7.5502525317, 14.5502525317), (12.5, 12.5))
            Line((12.5, 12.5), (17.5, 12.5))
            ThreePointArc((17.5, 12.5), (19.6213203436, 11.6213203436), (20.5, 9.5))
            Line((20.5, 9.5), (20.5, 4.5))
            ThreePointArc((20.5, 4.5), (19.6213203436, 2.3786796564), (17.5, 1.5))
            Line((17.5, 1.5), (-17.5, 1.5))
            ThreePointArc((-17.5, 1.5), (-19.6213203436, 2.3786796564), (-20.5, 4.5))
            Line((-20.5, 4.5), (-20.5, 9.5))
            ThreePointArc((-20.5, 9.5), (-19.6213203436, 11.6213203436), (-17.5, 12.5))
            Line((-17.5, 12.5), (-12.5, 12.5))
            ThreePointArc((-12.5, 12.5), (-7.5502525317, 14.5502525317), (-5.5, 19.5))
        make_face(mode=Mode.SUBTRACT)
    extrude(amount=F3_DEPTH)

    # F4
    f4_edges = [f1.edges().sort_by_distance(p)[0] for p in [
        (-7, -3, 29.5),
        (-5.5, -3, 29.5),
    ]]
    fillet(f4_edges, radius=F4_R)


solid = f1.part
